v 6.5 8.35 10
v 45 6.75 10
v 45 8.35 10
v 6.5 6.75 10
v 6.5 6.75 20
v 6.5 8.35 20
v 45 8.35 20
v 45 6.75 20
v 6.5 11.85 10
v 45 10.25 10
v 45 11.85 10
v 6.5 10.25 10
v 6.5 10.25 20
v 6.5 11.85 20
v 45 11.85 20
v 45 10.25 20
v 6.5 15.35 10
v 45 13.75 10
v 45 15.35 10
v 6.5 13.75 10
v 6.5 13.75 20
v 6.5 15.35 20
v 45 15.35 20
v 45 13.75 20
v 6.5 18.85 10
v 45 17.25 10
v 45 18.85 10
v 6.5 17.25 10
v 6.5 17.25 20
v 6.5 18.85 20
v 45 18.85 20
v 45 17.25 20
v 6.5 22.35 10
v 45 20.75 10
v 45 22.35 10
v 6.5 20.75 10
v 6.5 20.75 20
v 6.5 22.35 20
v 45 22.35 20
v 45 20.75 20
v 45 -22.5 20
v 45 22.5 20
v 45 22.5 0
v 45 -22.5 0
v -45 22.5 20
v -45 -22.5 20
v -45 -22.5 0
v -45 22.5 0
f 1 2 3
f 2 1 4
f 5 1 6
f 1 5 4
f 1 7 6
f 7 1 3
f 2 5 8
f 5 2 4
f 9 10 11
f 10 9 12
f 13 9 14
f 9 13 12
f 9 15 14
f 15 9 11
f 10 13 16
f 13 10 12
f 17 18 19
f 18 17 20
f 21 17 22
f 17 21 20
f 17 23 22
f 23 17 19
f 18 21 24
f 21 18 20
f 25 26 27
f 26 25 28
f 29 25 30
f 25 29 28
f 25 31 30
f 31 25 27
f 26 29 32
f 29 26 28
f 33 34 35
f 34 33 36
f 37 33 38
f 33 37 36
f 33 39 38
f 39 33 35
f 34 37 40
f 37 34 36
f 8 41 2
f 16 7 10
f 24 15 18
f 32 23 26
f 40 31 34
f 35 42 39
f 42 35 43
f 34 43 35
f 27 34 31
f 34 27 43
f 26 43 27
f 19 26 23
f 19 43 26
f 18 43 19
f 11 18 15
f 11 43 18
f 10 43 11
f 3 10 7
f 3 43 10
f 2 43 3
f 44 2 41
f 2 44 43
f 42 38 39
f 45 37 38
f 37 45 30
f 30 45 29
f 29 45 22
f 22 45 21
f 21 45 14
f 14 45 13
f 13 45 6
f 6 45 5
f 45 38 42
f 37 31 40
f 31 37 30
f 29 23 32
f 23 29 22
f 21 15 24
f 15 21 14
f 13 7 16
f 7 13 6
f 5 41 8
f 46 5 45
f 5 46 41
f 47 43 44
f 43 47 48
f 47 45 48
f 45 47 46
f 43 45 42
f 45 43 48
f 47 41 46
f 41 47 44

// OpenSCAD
// Microscope Slide Drying Rack
// Designed for 10 slides (75x25x1mm) standing on long edge

// --- Dimensions ---
block_length = 90.0;      // X dimension of the base block
block_width = 45.0;       // Y dimension of the base block
block_height = 20.0;      // Z dimension of the base block

slot_length = 77.0;       // X dimension of the slots
slot_width = 1.6;         // Y dimension of the slots
slot_depth = 10.0;        // Z depth of the slots

slot_spacing = 3.5;       // Y center-to-center distance between slots
num_slots = 10;           // Number of slots

// --- Resolution ---
$fn = 64;

// --- Implementation ---

// The part is built such that it rests on the XY plane at Z = 0.
// The block is centered on X and Y.

difference() {
    // Main block body
    // Centered on X and Y, bottom face at Z = 0
    translate([-block_length/2, -block_width/2, 0])
        cube([block_length, block_width, block_height]);

    // Create the slots
    // 1. Calculate the total span of the centers of the slots
    //    The distance from the center of the first slot to the center of the last is (num_slots - 1) * slot_spacing
    // 2. To center the group of slots in Y:
    //    The center of the group is at block_width / 2.
    //    The first slot center is at (block_width / 2) - ((num_slots - 1) * slot_spacing / 2)
    // 3. To center the group of slots in X:
    //    The center of the group is at block_length / 2.
    //    The first slot center is at (block_length / 2) - (slot_length / 2)
    
    let(
        total_span_y = (num_slots - 1) * slot_spacing,
        start_x = (block_length - slot_length) / 2,
        start_y = (block_width - total_span_y) / 2,
        start_z = block_height - slot_depth
    )
    translate([start_x, start_y, start_z]) {
        for (i = [0 : num_slots - 1]) {
            translate([0, i * slot_spacing, 0]) {
                // We use a slightly larger dimension for the cutting cube 
                // to ensure it cuts through the faces (Rule 5)
                cube([slot_length + 2, slot_width, slot_depth + 1]);
            }
        }
    }
}

// Verification of requirements:
// - Block: 90 x 45 x 20.
// - Slots: 77 x 1.6 x 10.
// - Slot spacing: 3.5 center-to-center.
// - Centered in X and Y.
// - Rests on XY plane at Z=0.
